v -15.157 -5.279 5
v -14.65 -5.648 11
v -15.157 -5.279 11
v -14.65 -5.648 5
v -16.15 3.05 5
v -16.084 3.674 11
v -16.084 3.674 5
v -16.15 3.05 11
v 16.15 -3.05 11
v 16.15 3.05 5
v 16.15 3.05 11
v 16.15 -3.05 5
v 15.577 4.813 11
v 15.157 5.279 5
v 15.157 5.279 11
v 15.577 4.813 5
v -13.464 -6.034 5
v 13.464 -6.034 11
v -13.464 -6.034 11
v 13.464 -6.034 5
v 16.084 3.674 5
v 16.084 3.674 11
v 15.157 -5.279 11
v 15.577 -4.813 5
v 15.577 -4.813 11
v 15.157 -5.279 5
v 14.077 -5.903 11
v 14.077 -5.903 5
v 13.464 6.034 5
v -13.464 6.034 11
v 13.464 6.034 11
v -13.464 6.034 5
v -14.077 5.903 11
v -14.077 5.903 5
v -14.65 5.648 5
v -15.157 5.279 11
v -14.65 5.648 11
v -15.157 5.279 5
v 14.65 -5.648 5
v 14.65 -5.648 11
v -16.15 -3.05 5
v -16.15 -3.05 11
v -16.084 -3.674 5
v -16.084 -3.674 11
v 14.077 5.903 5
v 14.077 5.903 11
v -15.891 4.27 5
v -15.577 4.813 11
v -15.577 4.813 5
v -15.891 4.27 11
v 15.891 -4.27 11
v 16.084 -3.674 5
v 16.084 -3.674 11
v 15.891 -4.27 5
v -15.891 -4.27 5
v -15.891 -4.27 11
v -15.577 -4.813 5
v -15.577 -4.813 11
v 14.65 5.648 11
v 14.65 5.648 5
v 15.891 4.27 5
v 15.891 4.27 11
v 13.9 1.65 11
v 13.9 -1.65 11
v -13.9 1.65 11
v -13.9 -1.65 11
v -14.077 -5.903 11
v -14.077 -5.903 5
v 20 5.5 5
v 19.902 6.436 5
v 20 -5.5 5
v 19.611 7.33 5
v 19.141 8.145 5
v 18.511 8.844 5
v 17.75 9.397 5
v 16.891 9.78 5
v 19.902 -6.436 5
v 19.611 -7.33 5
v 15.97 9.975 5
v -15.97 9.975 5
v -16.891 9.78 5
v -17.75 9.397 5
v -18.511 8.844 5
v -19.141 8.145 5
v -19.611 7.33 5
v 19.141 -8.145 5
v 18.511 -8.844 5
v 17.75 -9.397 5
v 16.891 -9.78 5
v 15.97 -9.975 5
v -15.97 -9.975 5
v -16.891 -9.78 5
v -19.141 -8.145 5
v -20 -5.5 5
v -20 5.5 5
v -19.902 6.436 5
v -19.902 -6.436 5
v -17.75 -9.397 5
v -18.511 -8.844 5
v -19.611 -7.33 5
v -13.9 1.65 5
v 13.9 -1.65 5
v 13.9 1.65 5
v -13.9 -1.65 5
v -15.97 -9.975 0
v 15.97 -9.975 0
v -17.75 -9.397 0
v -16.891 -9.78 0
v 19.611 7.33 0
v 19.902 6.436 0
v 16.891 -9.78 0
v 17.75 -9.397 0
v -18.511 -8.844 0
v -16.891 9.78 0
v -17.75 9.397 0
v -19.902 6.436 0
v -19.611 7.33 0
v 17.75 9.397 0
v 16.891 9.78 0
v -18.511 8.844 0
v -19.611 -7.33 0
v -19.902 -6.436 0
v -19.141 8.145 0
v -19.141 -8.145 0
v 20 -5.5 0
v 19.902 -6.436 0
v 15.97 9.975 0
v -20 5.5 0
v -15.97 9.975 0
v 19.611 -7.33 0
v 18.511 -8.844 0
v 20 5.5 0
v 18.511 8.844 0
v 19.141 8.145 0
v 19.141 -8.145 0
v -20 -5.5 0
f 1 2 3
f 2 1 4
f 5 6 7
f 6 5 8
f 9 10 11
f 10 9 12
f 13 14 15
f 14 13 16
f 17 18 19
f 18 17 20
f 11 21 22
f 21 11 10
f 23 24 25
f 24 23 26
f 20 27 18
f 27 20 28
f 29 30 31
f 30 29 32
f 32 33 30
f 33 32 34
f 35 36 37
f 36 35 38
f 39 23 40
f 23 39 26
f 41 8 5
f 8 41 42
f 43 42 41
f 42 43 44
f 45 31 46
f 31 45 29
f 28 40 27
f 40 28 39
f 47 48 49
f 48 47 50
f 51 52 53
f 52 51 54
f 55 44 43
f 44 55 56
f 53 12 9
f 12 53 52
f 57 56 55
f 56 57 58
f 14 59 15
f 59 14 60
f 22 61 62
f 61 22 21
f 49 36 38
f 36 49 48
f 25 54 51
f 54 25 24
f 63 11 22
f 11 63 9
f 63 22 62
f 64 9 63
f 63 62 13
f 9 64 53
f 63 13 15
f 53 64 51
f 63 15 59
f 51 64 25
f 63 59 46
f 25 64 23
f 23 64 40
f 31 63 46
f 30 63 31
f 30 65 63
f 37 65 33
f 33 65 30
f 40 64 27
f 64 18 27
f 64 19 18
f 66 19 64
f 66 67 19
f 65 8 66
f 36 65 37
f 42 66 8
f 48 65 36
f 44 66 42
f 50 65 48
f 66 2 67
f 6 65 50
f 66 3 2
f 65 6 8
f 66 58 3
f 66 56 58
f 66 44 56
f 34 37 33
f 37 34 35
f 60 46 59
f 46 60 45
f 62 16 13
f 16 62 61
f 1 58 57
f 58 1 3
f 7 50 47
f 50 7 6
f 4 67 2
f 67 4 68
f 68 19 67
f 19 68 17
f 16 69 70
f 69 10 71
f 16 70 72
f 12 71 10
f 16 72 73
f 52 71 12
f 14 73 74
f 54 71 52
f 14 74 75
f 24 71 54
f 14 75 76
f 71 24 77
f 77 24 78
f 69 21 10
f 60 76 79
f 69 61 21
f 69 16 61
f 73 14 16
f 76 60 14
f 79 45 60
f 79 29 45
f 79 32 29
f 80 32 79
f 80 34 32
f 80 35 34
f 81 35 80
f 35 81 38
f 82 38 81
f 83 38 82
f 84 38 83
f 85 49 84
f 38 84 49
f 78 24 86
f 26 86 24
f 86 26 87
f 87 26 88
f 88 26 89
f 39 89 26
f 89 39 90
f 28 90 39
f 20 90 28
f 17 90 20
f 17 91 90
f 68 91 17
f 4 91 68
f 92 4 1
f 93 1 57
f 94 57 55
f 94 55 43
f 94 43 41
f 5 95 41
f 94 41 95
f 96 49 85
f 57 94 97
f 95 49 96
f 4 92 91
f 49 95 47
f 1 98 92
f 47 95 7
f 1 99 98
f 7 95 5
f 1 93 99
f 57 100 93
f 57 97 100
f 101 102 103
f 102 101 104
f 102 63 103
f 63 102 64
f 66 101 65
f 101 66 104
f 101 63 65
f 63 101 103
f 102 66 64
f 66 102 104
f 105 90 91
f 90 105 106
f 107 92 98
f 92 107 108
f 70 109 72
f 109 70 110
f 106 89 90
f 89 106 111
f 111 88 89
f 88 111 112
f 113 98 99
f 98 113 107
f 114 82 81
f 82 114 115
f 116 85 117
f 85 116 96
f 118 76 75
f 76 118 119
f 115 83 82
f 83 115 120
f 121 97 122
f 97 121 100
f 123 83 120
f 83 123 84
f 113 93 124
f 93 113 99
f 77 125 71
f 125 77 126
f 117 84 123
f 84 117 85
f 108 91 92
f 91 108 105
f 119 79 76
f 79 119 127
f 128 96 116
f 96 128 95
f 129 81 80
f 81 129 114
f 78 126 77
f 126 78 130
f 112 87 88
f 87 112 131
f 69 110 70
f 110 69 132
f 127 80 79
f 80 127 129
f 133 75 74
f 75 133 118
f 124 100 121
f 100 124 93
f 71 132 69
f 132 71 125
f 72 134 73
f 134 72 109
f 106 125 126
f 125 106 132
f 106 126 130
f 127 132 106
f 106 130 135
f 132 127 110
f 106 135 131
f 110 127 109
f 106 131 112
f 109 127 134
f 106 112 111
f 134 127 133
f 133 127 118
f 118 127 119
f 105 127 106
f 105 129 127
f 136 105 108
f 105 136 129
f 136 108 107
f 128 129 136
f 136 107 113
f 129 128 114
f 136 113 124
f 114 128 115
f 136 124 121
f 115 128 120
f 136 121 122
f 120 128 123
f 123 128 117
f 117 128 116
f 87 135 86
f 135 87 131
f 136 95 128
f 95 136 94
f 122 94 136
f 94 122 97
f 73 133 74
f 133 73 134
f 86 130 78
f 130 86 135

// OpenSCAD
//-- two rounded flat cubes with a slot in the middle
//-- rear feet have an extra slot at right angle
//-- also left foot is mirror of right foot

x1=40;

y1=20;

th=5;
  
//-- OK, now we define the cylinders that are going to be at
//-- the four corners of our rounded corners box.

//-- the radius of the cylinders
box_corner_radius=4.5;

//-- The centers of the four corner cylinders

P1=[x1/2-box_corner_radius,y1/2-box_corner_radius,0];
P2=[x1/2-box_corner_radius,-y1/2+box_corner_radius,0];
P3=[-x1/2+box_corner_radius,-y1/2+box_corner_radius,0];
P4=[-x1/2+box_corner_radius,y1/2-box_corner_radius,0];

translate([0,0,th/2]) {
  hull() {
    translate(P1)
      cylinder(r=box_corner_radius,h=th,$fn=30,center=true);
      
    translate(P2)
      cylinder(r=box_corner_radius,h=th,$fn=30,center=true);
      
    translate(P3)
      cylinder(r=box_corner_radius,h=th,$fn=30,center=true);
      
    translate(P4)
      cylinder(r=box_corner_radius,h=th,$fn=30,center=true);
  }
}

//-- OK, now we define the cylinders that are going to be at
//-- the four corners of our 2nd rounded corners box.
x2=35.3;

y2=15.1;

th2=6;
//-- the radius of the cylinders
bc2=3;

//-- slot size
x3=27.8;
y3=3.3;
th3=th2+1;

//-- The centers of the four corner cylinders

PT1=[x2/2-box_corner_radius,y2/2-box_corner_radius,0];
PT2=[x2/2-box_corner_radius,-y2/2+box_corner_radius,0];
PT3=[-x2/2+box_corner_radius,-y2/2+box_corner_radius,0];
PT4=[-x2/2+box_corner_radius,y2/2-box_corner_radius,0];

difference() {
  translate([0,0,th+th2/2]) {
    hull() {
      translate(PT1)
	cylinder(r=bc2,h=th2,$fn=30,center=true);
	
      translate(PT2)
	cylinder(r=bc2,h=th2,$fn=30,center=true);
	
      translate(PT3)
	cylinder(r=bc2,h=th2,$fn=30,center=true);
	
      translate(PT4)
	cylinder(r=bc2,h=th2,$fn=30,center=true);
    }
  }

  //-- Now we define the main rectangle which we are going to hollow out

  translate([0,0,th+th3/2])
    cube([x3,y3,th3],center=true);
}
